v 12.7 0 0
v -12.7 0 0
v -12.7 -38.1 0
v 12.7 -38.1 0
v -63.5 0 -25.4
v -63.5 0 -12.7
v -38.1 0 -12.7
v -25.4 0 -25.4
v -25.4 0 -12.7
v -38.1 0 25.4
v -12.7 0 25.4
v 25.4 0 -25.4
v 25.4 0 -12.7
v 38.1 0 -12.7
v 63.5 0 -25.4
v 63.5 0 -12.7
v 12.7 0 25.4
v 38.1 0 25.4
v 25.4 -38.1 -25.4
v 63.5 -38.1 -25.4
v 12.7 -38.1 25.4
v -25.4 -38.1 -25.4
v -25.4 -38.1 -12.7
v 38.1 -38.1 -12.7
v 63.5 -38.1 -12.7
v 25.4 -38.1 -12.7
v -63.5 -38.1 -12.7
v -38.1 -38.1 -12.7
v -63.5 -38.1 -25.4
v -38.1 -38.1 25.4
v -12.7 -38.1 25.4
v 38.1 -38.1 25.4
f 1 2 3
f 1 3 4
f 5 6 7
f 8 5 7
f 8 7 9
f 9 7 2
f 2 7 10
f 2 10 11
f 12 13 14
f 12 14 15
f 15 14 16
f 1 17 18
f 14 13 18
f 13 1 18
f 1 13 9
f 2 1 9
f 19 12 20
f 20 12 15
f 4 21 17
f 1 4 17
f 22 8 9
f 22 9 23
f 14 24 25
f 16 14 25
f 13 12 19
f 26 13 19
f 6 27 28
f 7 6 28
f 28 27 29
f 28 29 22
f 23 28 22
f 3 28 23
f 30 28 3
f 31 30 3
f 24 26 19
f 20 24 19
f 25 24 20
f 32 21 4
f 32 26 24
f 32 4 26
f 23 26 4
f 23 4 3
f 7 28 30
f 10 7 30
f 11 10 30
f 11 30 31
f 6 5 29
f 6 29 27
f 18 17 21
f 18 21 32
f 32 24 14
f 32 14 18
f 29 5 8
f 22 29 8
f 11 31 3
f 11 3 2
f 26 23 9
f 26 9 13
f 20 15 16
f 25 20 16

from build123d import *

# Parameters (mm, degrees)
F0_W     = 127
F0_H     = 50.8
F1_DEPTH = 38.1
F2_W     = 50.8
F2_H     = 38.1
F3_DEPTH = 12.7
F4_W     = 25.4
F4_H     = 38.1
F5_DEPTH = 38.1
F6_W     = 25.4
F6_H     = 38.1
F7_DEPTH = 38.1
F8_W     = 25.4
F8_H     = 38.1
F9_DEPTH = 25.4


with BuildPart() as f1:
    # F0 (on Front) → F1 (new body)
    with BuildSketch(Plane.XZ):
        Rectangle(F0_W, F0_H)
    extrude(amount=F1_DEPTH)

    # F2 (on face) → F3 (cut)
    with BuildSketch(Plane(origin=(0, 0, -25.4), x_dir=(1, 0, 0), z_dir=(0, 0, -1))):
        with Locations((0, 19.05)):
            Rectangle(F2_W, F2_H)
    extrude(amount=-F3_DEPTH, mode=Mode.SUBTRACT)

    # F4 (on face) → F5 (cut)
    with BuildSketch(Plane.XZ.offset(38.1)):
        with Locations((-50.8, 6.35)):
            Rectangle(F4_W, F4_H)
    extrude(amount=-F5_DEPTH, mode=Mode.SUBTRACT)

    # F6 (on face) → F7 (cut)
    with BuildSketch(Plane.XZ.offset(38.1)):
        with Locations((50.8, 6.35)):
            Rectangle(F6_W, F6_H)
    extrude(amount=-F7_DEPTH, mode=Mode.SUBTRACT)

    # F8 (on face) → F9 (cut)
    with BuildSketch(Plane.XY.offset(25.4)):
        with Locations((0, -19.05)):
            Rectangle(F8_W, F8_H)
    extrude(amount=-F9_DEPTH, mode=Mode.SUBTRACT)


solid = f1.part
